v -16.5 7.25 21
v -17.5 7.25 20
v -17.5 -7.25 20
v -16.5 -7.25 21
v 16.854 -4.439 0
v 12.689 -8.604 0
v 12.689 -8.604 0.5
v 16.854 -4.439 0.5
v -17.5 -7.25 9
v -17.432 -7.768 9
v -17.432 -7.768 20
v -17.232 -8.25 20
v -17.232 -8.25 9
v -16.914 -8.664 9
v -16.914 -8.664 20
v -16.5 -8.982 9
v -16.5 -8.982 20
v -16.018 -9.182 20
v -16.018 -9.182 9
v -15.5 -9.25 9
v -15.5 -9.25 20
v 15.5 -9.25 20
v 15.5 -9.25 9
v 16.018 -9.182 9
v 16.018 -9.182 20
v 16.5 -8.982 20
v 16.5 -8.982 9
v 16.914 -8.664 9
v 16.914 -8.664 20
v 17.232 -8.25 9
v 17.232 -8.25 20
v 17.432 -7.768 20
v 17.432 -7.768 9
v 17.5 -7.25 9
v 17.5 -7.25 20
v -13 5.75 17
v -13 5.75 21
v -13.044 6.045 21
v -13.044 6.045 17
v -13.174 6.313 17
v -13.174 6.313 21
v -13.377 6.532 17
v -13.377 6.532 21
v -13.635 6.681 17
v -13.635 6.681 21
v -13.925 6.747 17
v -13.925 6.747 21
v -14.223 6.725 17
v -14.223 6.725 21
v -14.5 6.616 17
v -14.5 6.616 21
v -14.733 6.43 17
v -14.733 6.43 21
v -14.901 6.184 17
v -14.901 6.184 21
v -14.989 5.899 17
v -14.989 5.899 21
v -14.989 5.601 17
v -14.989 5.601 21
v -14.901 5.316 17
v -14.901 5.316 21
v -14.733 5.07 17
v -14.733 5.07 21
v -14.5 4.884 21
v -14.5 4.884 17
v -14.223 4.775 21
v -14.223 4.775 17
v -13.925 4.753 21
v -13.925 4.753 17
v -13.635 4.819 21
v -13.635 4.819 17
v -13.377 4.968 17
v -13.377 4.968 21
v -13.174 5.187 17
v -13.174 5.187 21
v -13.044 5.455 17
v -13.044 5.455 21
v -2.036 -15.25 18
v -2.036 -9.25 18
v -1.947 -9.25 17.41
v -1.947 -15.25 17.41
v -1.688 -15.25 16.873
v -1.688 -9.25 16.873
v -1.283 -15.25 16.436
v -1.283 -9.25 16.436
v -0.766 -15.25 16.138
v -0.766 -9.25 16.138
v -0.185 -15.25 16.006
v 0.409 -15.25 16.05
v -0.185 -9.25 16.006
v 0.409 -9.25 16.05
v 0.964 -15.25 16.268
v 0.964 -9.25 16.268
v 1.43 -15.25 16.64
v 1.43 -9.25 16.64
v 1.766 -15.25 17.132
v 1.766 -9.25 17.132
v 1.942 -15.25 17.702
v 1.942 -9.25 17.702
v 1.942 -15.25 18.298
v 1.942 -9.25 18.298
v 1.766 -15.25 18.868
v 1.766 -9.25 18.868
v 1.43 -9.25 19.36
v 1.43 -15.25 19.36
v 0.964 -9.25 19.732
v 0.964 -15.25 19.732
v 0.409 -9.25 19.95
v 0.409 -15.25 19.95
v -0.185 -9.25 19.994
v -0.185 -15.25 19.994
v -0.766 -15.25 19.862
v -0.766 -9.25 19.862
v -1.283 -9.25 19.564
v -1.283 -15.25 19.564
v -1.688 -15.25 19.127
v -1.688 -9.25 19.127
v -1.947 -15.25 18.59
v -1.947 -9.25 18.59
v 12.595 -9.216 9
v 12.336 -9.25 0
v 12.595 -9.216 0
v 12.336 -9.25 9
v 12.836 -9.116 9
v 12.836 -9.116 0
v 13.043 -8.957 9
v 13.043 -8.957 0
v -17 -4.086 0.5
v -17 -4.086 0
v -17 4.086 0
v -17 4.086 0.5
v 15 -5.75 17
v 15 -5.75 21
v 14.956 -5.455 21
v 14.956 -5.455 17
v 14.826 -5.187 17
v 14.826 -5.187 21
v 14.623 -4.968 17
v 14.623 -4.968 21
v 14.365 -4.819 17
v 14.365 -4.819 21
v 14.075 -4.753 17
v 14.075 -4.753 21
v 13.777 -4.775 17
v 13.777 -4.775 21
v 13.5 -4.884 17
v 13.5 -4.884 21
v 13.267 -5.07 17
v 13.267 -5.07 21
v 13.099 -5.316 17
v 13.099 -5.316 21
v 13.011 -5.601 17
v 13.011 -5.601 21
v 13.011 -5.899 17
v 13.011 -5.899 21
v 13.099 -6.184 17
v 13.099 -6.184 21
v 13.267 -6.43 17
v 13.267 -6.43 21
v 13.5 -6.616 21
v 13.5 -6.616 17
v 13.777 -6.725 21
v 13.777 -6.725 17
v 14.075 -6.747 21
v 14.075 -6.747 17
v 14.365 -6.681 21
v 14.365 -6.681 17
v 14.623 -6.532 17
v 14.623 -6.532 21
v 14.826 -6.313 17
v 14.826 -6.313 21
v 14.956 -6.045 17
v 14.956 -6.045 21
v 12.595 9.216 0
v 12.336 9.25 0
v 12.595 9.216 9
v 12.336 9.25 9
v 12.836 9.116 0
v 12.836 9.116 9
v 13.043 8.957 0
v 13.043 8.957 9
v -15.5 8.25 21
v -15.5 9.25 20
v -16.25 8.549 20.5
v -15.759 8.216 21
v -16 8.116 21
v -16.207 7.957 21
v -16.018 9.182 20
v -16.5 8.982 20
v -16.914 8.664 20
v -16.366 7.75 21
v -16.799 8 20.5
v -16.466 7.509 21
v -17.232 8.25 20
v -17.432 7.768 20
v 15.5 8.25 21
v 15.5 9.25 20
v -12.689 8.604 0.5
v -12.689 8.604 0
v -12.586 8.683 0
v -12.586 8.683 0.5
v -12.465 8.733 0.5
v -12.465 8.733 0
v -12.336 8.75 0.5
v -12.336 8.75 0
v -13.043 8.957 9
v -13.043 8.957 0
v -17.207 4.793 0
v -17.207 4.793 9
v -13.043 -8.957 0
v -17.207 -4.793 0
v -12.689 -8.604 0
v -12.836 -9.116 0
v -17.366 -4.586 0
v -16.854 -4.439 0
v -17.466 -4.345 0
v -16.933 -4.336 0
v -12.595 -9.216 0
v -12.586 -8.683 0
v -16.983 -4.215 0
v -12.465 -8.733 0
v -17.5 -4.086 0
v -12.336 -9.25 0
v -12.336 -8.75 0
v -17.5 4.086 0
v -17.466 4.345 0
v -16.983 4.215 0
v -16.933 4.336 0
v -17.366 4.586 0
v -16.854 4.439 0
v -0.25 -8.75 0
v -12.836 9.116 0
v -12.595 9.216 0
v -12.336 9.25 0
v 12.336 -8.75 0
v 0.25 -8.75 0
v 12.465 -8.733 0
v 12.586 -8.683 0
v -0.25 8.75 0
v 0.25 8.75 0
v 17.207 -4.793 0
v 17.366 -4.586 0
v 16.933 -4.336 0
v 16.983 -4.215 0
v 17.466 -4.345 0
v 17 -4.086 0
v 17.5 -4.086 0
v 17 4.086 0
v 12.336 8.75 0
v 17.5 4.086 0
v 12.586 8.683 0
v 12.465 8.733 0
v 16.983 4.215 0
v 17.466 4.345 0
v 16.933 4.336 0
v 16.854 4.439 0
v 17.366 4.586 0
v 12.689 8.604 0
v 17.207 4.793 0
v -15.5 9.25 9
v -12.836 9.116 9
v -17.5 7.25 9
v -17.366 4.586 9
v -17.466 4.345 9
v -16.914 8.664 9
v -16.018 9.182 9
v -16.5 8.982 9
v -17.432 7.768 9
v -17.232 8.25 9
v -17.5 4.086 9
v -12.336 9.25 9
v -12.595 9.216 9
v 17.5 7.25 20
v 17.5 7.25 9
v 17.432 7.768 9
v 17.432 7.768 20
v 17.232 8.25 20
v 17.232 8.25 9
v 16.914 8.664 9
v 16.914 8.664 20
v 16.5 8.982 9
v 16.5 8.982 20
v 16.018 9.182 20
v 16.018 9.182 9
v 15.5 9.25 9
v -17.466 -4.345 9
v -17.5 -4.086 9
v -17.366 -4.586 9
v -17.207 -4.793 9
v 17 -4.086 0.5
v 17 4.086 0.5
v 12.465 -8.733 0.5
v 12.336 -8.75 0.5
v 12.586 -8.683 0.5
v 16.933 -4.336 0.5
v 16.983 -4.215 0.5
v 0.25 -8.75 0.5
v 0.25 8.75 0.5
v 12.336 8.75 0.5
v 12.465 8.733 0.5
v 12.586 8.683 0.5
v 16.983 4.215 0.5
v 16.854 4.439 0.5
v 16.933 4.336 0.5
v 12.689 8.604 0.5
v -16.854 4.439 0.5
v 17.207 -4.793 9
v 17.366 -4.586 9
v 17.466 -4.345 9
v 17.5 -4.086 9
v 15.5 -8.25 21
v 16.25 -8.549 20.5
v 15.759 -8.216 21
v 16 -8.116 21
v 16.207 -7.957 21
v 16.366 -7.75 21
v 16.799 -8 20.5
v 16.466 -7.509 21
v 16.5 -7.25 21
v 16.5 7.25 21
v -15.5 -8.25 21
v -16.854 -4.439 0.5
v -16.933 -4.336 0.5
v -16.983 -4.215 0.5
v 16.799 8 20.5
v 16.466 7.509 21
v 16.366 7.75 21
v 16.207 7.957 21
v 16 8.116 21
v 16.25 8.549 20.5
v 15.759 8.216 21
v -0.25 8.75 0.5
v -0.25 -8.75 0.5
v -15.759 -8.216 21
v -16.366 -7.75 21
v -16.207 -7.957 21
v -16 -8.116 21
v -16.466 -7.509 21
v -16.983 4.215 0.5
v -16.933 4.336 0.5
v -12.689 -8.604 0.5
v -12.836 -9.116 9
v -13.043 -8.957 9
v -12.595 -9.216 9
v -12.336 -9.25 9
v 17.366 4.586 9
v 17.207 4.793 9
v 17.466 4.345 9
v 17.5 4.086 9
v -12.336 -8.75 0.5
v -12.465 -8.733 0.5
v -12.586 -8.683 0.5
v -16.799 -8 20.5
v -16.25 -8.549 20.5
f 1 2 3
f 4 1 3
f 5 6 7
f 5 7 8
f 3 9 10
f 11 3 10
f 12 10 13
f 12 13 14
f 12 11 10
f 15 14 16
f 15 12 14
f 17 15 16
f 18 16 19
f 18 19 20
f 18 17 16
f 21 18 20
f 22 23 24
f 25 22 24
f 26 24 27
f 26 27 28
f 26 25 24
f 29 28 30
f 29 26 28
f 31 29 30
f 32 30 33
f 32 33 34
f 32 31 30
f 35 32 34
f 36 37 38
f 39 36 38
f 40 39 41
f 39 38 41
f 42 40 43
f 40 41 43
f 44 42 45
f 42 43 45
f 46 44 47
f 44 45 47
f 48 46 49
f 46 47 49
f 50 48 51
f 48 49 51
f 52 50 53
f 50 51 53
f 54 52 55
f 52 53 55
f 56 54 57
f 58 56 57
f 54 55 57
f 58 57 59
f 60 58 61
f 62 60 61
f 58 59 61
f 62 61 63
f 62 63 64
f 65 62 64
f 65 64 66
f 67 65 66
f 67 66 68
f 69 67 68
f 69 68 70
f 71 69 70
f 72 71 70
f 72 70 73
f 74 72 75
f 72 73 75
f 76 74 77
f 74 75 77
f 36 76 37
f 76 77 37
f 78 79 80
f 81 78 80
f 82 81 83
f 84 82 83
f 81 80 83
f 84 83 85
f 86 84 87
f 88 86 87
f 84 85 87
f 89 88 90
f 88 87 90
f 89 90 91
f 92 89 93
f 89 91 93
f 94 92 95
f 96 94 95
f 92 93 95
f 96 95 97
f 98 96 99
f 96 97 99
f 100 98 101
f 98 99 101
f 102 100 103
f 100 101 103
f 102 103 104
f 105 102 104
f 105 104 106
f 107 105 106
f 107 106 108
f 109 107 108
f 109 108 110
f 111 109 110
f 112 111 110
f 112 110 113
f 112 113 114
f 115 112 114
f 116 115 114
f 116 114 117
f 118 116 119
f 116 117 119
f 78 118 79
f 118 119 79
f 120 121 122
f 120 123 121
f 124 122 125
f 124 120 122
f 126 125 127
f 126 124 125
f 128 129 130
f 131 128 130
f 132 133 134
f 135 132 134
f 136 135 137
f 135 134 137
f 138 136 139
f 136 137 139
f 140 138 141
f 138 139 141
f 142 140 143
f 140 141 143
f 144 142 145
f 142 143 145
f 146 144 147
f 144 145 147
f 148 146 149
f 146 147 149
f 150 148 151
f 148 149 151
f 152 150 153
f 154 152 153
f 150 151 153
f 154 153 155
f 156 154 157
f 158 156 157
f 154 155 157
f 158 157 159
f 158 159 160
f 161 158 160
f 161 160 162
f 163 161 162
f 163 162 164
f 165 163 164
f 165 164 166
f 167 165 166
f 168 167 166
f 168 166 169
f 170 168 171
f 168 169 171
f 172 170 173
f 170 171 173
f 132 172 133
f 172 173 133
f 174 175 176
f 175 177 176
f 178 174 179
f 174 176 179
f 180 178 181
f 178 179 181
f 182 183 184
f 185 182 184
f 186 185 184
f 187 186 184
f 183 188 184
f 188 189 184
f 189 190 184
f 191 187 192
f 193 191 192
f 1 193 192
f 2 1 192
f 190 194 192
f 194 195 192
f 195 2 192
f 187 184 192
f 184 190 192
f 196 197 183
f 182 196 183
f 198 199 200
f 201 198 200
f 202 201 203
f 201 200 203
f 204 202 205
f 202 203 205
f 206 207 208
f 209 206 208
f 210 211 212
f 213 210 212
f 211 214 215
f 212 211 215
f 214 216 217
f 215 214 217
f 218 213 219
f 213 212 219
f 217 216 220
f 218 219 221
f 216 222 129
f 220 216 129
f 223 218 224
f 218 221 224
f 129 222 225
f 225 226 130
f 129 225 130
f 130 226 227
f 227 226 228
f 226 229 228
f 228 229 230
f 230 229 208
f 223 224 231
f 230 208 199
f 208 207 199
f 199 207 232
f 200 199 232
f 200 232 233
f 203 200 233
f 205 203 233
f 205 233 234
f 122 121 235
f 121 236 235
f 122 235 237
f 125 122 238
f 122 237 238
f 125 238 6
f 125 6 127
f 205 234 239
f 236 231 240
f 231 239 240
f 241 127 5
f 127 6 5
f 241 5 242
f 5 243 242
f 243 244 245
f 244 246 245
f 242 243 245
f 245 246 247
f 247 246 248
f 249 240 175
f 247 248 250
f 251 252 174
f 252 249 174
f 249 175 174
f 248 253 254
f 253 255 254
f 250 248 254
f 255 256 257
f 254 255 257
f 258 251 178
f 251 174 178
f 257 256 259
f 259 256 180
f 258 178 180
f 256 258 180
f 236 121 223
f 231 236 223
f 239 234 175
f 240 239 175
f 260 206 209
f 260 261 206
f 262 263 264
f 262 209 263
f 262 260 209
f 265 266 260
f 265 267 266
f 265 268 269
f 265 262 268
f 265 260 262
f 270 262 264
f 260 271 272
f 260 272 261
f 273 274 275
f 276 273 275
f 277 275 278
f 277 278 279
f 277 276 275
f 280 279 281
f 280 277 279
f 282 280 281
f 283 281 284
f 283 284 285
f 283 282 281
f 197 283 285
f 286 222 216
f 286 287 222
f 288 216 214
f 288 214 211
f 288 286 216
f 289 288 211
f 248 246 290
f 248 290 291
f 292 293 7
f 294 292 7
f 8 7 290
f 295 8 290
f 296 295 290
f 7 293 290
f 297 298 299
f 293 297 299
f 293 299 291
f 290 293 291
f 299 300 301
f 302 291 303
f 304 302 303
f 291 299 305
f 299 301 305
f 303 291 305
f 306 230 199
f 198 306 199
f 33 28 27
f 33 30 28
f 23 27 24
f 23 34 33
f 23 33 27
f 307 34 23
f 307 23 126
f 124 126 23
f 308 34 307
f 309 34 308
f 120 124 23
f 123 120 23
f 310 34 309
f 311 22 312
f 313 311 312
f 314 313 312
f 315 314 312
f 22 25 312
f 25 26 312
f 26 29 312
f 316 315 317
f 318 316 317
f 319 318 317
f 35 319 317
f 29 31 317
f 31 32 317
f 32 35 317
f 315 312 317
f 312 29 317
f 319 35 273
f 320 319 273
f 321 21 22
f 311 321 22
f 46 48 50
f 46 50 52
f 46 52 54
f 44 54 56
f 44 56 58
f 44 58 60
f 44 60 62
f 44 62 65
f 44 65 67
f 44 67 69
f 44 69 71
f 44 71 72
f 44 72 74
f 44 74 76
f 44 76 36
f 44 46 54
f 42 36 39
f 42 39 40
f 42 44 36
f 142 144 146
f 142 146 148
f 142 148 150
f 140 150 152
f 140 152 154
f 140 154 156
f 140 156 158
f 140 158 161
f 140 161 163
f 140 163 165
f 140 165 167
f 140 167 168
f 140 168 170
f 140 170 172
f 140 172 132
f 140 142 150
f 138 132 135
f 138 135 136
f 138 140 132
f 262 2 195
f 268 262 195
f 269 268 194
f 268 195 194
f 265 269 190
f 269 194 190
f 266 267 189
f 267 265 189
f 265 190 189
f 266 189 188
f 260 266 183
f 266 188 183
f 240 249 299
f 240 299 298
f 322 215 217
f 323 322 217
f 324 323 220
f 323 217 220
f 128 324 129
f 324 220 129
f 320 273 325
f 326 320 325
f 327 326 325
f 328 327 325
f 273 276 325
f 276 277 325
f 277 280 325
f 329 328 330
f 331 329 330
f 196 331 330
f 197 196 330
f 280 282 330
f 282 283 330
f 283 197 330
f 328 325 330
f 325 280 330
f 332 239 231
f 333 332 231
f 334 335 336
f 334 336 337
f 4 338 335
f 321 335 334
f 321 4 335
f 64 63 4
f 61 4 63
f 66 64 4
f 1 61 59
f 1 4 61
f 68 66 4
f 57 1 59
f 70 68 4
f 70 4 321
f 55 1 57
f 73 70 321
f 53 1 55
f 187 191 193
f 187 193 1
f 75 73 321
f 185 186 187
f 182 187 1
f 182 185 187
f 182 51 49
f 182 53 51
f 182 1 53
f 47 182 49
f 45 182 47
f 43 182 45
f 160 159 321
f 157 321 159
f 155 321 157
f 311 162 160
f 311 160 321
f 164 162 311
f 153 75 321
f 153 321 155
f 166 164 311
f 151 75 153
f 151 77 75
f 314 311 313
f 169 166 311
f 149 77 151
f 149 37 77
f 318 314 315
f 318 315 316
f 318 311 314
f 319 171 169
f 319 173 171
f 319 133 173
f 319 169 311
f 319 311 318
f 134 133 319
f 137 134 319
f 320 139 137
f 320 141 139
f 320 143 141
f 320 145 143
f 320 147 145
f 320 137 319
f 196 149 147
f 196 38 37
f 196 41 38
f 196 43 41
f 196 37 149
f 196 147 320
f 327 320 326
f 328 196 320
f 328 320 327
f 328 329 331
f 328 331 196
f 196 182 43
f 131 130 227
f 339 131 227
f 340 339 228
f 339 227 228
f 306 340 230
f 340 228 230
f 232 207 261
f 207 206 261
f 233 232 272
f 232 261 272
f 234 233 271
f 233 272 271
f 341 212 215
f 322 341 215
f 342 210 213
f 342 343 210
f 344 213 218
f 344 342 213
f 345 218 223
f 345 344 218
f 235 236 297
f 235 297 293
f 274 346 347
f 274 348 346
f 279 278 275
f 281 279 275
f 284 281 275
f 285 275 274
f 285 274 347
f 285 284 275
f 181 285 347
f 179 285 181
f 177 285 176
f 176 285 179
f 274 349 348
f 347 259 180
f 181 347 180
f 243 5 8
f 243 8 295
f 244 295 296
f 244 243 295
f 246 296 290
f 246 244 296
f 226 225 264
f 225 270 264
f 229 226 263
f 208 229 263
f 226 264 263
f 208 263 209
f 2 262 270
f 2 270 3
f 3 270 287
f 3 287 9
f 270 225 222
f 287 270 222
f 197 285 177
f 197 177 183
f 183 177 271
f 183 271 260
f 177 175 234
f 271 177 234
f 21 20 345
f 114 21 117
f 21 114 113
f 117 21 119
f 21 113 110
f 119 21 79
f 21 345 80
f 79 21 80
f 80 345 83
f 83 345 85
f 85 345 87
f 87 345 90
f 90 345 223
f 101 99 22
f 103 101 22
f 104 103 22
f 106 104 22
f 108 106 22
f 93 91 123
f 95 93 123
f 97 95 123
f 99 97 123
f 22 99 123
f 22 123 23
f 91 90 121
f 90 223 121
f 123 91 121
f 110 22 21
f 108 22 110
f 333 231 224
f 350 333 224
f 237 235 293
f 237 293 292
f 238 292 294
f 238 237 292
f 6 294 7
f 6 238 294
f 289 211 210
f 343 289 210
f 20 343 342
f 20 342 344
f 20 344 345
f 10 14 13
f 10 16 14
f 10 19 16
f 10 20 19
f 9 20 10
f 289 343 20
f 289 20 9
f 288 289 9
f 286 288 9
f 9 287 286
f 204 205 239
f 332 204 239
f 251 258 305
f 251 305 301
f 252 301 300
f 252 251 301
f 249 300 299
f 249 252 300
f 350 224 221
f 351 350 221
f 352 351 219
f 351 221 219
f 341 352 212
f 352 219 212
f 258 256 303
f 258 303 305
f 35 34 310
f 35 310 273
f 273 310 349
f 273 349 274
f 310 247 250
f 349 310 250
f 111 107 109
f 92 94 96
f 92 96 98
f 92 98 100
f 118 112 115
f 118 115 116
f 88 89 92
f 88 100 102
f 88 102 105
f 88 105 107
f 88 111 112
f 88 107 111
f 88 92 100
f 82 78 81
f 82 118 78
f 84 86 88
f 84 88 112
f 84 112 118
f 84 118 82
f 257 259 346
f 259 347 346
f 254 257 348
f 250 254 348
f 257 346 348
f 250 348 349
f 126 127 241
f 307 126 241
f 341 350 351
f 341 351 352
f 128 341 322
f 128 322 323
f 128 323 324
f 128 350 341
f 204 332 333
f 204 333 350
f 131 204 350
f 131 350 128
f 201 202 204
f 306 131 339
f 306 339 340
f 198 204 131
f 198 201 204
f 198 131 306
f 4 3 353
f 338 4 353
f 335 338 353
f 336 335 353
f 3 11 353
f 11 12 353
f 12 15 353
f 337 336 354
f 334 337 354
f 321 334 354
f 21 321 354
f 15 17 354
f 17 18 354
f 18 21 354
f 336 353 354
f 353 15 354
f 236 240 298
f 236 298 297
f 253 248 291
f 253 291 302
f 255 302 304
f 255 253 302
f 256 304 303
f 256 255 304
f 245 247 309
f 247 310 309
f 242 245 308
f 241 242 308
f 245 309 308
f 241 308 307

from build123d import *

# Parameters (mm, degrees)
ESQUISSE1_W             = 35
ESQUISSE1_H             = 18.5
BOSS_EXTRU_1_DEPTH      = 21
CONG_1_R                = 2
ESQUISSE2_R             = 1
ENL_V_MAT_EXTRU_1_DEPTH = 4
ESQUISSE3_OUTSIDE_W     = 45.962
ESQUISSE3_OUTSIDE_H     = 29.462
ENL_V_MAT_EXTRU_2_DEPTH = 9
CONG_2_R                = 1
ENL_V_MAT_EXTRU_3_DEPTH = 0.5
ESQUISSE5_R             = 2
BOSS_EXTRU_2_DEPTH      = 6
CHANFREIN1_SIZE         = 1


with BuildPart() as part:
    # Esquisse1 → Boss.-Extru.1 (new body)
    with BuildSketch(Plane.XY):
        Rectangle(ESQUISSE1_W, ESQUISSE1_H)
    extrude(amount=BOSS_EXTRU_1_DEPTH)

    # Congé1
    cong_1_edges = [part.edges().sort_by_distance(p)[0] for p in [
        (-17.5, 9.25, 10.5),
        (17.5, 9.25, 10.5),
        (17.5, -9.25, 10.5),
        (-17.5, -9.25, 10.5),
    ]]
    fillet(cong_1_edges, radius=CONG_1_R)

    # Esquisse2 → Enlèv. mat.-Extru.1 (cut)
    with BuildSketch(Plane.XY.offset(21)):
        with Locations((-14, 5.75)):
            Circle(ESQUISSE2_R)
        with Locations((14, -5.75)):
            Circle(ESQUISSE2_R)
    extrude(amount=-ENL_V_MAT_EXTRU_1_DEPTH, mode=Mode.SUBTRACT)

    # Esquisse3 outside → Enlèv. mat.-Extru.2 (cut)
    with BuildSketch(Plane(origin=(0, 0, 0), x_dir=(-1, 0, 0), z_dir=(0, 0, -1))):
        Rectangle(ESQUISSE3_OUTSIDE_W, ESQUISSE3_OUTSIDE_H)
        Polygon((-17.5, 4.5), (-12.75, 9.25), (12.75, 9.25), (17.5, 4.5), (17.5, -4.5), (12.75, -9.25), (-12.75, -9.25), (-17.5, -4.5), align=None, mode=Mode.SUBTRACT)
    extrude(amount=-ENL_V_MAT_EXTRU_2_DEPTH, mode=Mode.SUBTRACT)

    # Congé2
    cong_2_edges = [part.edges().sort_by_distance(p)[0] for p in [
        (17.5, 4.5, 4.5),
        (12.75, 9.25, 4.5),
        (-12.75, 9.25, 4.5),
        (-17.5, 4.5, 4.5),
        (-17.5, -4.5, 4.5),
        (-12.75, -9.25, 4.5),
        (12.75, -9.25, 4.5),
        (17.5, -4.5, 4.5),
    ]]
    fillet(cong_2_edges, radius=CONG_2_R)

    # Esquisse4 → Enlèv. mat.-Extru.3 (cut)
    with BuildSketch(Plane(origin=(0, 0, 0), x_dir=(-1, 0, 0), z_dir=(0, 0, -1))):
        with BuildLine():
            Line((-0.25, 8.75), (-0.25, -8.75))
            Line((-0.25, -8.75), (-12.335786438, -8.75))
            ThreePointArc((-12.335786438, -8.75), (-12.527128154, -8.711939766), (-12.689339828, -8.603553391))
            Line((-12.689339828, -8.603553391), (-16.853553391, -4.439339828))
            ThreePointArc((-16.853553391, -4.439339828), (-16.961939766, -4.277128154), (-17, -4.085786438))
            Line((-17, -4.085786438), (-17, 4.085786438))
            ThreePointArc((-17, 4.085786438), (-16.961939766, 4.277128154), (-16.853553391, 4.439339828))
            Line((-16.853553391, 4.439339828), (-12.689339828, 8.603553391))
            ThreePointArc((-12.689339828, 8.603553391), (-12.527128154, 8.711939766), (-12.335786438, 8.75))
            Line((-12.335786438, 8.75), (-0.25, 8.75))
        make_face()
        with BuildLine():
            Line((0.25, 8.75), (0.25, -8.75))
            Line((0.25, -8.75), (12.335786438, -8.75))
            ThreePointArc((12.335786438, -8.75), (12.527128154, -8.711939766), (12.689339828, -8.603553391))
            Line((12.689339828, -8.603553391), (16.853553391, -4.439339828))
            ThreePointArc((16.853553391, -4.439339828), (16.961939766, -4.277128154), (17, -4.085786438))
            Line((17, -4.085786438), (17, 4.085786438))
            ThreePointArc((17, 4.085786438), (16.961939766, 4.277128154), (16.853553391, 4.439339828))
            Line((16.853553391, 4.439339828), (12.689339828, 8.603553391))
            ThreePointArc((12.689339828, 8.603553391), (12.527128154, 8.711939766), (12.335786438, 8.75))
            Line((12.335786438, 8.75), (0.25, 8.75))
        make_face()
    extrude(amount=-ENL_V_MAT_EXTRU_3_DEPTH, mode=Mode.SUBTRACT)

    # Esquisse5 → Boss.-Extru.2 (add)
    with BuildSketch(Plane.XZ.offset(9.25)):
        with Locations(Location((-0.035714286, 18, 0), (0, 0, 180))):
            Circle(ESQUISSE5_R)
    extrude(amount=BOSS_EXTRU_2_DEPTH)

    # Chanfrein1
    chanfrein1_edges = [part.edges().sort_by_distance(p)[0] for p in [
        (0, -9.25, 21),
        (-17.5, 0, 21),
        (17.5, 0, 21),
        (0, 9.25, 21),
        (16.914213562, 8.664213562, 21),
        (-16.914213562, 8.664213562, 21),
        (16.914213562, -8.664213562, 21),
        (-16.914213562, -8.664213562, 21),
    ]]
    chamfer(chanfrein1_edges, length=CHANFREIN1_SIZE - 0.0001)  # a hair under: the kernel refuses the full size


solid = part.part
